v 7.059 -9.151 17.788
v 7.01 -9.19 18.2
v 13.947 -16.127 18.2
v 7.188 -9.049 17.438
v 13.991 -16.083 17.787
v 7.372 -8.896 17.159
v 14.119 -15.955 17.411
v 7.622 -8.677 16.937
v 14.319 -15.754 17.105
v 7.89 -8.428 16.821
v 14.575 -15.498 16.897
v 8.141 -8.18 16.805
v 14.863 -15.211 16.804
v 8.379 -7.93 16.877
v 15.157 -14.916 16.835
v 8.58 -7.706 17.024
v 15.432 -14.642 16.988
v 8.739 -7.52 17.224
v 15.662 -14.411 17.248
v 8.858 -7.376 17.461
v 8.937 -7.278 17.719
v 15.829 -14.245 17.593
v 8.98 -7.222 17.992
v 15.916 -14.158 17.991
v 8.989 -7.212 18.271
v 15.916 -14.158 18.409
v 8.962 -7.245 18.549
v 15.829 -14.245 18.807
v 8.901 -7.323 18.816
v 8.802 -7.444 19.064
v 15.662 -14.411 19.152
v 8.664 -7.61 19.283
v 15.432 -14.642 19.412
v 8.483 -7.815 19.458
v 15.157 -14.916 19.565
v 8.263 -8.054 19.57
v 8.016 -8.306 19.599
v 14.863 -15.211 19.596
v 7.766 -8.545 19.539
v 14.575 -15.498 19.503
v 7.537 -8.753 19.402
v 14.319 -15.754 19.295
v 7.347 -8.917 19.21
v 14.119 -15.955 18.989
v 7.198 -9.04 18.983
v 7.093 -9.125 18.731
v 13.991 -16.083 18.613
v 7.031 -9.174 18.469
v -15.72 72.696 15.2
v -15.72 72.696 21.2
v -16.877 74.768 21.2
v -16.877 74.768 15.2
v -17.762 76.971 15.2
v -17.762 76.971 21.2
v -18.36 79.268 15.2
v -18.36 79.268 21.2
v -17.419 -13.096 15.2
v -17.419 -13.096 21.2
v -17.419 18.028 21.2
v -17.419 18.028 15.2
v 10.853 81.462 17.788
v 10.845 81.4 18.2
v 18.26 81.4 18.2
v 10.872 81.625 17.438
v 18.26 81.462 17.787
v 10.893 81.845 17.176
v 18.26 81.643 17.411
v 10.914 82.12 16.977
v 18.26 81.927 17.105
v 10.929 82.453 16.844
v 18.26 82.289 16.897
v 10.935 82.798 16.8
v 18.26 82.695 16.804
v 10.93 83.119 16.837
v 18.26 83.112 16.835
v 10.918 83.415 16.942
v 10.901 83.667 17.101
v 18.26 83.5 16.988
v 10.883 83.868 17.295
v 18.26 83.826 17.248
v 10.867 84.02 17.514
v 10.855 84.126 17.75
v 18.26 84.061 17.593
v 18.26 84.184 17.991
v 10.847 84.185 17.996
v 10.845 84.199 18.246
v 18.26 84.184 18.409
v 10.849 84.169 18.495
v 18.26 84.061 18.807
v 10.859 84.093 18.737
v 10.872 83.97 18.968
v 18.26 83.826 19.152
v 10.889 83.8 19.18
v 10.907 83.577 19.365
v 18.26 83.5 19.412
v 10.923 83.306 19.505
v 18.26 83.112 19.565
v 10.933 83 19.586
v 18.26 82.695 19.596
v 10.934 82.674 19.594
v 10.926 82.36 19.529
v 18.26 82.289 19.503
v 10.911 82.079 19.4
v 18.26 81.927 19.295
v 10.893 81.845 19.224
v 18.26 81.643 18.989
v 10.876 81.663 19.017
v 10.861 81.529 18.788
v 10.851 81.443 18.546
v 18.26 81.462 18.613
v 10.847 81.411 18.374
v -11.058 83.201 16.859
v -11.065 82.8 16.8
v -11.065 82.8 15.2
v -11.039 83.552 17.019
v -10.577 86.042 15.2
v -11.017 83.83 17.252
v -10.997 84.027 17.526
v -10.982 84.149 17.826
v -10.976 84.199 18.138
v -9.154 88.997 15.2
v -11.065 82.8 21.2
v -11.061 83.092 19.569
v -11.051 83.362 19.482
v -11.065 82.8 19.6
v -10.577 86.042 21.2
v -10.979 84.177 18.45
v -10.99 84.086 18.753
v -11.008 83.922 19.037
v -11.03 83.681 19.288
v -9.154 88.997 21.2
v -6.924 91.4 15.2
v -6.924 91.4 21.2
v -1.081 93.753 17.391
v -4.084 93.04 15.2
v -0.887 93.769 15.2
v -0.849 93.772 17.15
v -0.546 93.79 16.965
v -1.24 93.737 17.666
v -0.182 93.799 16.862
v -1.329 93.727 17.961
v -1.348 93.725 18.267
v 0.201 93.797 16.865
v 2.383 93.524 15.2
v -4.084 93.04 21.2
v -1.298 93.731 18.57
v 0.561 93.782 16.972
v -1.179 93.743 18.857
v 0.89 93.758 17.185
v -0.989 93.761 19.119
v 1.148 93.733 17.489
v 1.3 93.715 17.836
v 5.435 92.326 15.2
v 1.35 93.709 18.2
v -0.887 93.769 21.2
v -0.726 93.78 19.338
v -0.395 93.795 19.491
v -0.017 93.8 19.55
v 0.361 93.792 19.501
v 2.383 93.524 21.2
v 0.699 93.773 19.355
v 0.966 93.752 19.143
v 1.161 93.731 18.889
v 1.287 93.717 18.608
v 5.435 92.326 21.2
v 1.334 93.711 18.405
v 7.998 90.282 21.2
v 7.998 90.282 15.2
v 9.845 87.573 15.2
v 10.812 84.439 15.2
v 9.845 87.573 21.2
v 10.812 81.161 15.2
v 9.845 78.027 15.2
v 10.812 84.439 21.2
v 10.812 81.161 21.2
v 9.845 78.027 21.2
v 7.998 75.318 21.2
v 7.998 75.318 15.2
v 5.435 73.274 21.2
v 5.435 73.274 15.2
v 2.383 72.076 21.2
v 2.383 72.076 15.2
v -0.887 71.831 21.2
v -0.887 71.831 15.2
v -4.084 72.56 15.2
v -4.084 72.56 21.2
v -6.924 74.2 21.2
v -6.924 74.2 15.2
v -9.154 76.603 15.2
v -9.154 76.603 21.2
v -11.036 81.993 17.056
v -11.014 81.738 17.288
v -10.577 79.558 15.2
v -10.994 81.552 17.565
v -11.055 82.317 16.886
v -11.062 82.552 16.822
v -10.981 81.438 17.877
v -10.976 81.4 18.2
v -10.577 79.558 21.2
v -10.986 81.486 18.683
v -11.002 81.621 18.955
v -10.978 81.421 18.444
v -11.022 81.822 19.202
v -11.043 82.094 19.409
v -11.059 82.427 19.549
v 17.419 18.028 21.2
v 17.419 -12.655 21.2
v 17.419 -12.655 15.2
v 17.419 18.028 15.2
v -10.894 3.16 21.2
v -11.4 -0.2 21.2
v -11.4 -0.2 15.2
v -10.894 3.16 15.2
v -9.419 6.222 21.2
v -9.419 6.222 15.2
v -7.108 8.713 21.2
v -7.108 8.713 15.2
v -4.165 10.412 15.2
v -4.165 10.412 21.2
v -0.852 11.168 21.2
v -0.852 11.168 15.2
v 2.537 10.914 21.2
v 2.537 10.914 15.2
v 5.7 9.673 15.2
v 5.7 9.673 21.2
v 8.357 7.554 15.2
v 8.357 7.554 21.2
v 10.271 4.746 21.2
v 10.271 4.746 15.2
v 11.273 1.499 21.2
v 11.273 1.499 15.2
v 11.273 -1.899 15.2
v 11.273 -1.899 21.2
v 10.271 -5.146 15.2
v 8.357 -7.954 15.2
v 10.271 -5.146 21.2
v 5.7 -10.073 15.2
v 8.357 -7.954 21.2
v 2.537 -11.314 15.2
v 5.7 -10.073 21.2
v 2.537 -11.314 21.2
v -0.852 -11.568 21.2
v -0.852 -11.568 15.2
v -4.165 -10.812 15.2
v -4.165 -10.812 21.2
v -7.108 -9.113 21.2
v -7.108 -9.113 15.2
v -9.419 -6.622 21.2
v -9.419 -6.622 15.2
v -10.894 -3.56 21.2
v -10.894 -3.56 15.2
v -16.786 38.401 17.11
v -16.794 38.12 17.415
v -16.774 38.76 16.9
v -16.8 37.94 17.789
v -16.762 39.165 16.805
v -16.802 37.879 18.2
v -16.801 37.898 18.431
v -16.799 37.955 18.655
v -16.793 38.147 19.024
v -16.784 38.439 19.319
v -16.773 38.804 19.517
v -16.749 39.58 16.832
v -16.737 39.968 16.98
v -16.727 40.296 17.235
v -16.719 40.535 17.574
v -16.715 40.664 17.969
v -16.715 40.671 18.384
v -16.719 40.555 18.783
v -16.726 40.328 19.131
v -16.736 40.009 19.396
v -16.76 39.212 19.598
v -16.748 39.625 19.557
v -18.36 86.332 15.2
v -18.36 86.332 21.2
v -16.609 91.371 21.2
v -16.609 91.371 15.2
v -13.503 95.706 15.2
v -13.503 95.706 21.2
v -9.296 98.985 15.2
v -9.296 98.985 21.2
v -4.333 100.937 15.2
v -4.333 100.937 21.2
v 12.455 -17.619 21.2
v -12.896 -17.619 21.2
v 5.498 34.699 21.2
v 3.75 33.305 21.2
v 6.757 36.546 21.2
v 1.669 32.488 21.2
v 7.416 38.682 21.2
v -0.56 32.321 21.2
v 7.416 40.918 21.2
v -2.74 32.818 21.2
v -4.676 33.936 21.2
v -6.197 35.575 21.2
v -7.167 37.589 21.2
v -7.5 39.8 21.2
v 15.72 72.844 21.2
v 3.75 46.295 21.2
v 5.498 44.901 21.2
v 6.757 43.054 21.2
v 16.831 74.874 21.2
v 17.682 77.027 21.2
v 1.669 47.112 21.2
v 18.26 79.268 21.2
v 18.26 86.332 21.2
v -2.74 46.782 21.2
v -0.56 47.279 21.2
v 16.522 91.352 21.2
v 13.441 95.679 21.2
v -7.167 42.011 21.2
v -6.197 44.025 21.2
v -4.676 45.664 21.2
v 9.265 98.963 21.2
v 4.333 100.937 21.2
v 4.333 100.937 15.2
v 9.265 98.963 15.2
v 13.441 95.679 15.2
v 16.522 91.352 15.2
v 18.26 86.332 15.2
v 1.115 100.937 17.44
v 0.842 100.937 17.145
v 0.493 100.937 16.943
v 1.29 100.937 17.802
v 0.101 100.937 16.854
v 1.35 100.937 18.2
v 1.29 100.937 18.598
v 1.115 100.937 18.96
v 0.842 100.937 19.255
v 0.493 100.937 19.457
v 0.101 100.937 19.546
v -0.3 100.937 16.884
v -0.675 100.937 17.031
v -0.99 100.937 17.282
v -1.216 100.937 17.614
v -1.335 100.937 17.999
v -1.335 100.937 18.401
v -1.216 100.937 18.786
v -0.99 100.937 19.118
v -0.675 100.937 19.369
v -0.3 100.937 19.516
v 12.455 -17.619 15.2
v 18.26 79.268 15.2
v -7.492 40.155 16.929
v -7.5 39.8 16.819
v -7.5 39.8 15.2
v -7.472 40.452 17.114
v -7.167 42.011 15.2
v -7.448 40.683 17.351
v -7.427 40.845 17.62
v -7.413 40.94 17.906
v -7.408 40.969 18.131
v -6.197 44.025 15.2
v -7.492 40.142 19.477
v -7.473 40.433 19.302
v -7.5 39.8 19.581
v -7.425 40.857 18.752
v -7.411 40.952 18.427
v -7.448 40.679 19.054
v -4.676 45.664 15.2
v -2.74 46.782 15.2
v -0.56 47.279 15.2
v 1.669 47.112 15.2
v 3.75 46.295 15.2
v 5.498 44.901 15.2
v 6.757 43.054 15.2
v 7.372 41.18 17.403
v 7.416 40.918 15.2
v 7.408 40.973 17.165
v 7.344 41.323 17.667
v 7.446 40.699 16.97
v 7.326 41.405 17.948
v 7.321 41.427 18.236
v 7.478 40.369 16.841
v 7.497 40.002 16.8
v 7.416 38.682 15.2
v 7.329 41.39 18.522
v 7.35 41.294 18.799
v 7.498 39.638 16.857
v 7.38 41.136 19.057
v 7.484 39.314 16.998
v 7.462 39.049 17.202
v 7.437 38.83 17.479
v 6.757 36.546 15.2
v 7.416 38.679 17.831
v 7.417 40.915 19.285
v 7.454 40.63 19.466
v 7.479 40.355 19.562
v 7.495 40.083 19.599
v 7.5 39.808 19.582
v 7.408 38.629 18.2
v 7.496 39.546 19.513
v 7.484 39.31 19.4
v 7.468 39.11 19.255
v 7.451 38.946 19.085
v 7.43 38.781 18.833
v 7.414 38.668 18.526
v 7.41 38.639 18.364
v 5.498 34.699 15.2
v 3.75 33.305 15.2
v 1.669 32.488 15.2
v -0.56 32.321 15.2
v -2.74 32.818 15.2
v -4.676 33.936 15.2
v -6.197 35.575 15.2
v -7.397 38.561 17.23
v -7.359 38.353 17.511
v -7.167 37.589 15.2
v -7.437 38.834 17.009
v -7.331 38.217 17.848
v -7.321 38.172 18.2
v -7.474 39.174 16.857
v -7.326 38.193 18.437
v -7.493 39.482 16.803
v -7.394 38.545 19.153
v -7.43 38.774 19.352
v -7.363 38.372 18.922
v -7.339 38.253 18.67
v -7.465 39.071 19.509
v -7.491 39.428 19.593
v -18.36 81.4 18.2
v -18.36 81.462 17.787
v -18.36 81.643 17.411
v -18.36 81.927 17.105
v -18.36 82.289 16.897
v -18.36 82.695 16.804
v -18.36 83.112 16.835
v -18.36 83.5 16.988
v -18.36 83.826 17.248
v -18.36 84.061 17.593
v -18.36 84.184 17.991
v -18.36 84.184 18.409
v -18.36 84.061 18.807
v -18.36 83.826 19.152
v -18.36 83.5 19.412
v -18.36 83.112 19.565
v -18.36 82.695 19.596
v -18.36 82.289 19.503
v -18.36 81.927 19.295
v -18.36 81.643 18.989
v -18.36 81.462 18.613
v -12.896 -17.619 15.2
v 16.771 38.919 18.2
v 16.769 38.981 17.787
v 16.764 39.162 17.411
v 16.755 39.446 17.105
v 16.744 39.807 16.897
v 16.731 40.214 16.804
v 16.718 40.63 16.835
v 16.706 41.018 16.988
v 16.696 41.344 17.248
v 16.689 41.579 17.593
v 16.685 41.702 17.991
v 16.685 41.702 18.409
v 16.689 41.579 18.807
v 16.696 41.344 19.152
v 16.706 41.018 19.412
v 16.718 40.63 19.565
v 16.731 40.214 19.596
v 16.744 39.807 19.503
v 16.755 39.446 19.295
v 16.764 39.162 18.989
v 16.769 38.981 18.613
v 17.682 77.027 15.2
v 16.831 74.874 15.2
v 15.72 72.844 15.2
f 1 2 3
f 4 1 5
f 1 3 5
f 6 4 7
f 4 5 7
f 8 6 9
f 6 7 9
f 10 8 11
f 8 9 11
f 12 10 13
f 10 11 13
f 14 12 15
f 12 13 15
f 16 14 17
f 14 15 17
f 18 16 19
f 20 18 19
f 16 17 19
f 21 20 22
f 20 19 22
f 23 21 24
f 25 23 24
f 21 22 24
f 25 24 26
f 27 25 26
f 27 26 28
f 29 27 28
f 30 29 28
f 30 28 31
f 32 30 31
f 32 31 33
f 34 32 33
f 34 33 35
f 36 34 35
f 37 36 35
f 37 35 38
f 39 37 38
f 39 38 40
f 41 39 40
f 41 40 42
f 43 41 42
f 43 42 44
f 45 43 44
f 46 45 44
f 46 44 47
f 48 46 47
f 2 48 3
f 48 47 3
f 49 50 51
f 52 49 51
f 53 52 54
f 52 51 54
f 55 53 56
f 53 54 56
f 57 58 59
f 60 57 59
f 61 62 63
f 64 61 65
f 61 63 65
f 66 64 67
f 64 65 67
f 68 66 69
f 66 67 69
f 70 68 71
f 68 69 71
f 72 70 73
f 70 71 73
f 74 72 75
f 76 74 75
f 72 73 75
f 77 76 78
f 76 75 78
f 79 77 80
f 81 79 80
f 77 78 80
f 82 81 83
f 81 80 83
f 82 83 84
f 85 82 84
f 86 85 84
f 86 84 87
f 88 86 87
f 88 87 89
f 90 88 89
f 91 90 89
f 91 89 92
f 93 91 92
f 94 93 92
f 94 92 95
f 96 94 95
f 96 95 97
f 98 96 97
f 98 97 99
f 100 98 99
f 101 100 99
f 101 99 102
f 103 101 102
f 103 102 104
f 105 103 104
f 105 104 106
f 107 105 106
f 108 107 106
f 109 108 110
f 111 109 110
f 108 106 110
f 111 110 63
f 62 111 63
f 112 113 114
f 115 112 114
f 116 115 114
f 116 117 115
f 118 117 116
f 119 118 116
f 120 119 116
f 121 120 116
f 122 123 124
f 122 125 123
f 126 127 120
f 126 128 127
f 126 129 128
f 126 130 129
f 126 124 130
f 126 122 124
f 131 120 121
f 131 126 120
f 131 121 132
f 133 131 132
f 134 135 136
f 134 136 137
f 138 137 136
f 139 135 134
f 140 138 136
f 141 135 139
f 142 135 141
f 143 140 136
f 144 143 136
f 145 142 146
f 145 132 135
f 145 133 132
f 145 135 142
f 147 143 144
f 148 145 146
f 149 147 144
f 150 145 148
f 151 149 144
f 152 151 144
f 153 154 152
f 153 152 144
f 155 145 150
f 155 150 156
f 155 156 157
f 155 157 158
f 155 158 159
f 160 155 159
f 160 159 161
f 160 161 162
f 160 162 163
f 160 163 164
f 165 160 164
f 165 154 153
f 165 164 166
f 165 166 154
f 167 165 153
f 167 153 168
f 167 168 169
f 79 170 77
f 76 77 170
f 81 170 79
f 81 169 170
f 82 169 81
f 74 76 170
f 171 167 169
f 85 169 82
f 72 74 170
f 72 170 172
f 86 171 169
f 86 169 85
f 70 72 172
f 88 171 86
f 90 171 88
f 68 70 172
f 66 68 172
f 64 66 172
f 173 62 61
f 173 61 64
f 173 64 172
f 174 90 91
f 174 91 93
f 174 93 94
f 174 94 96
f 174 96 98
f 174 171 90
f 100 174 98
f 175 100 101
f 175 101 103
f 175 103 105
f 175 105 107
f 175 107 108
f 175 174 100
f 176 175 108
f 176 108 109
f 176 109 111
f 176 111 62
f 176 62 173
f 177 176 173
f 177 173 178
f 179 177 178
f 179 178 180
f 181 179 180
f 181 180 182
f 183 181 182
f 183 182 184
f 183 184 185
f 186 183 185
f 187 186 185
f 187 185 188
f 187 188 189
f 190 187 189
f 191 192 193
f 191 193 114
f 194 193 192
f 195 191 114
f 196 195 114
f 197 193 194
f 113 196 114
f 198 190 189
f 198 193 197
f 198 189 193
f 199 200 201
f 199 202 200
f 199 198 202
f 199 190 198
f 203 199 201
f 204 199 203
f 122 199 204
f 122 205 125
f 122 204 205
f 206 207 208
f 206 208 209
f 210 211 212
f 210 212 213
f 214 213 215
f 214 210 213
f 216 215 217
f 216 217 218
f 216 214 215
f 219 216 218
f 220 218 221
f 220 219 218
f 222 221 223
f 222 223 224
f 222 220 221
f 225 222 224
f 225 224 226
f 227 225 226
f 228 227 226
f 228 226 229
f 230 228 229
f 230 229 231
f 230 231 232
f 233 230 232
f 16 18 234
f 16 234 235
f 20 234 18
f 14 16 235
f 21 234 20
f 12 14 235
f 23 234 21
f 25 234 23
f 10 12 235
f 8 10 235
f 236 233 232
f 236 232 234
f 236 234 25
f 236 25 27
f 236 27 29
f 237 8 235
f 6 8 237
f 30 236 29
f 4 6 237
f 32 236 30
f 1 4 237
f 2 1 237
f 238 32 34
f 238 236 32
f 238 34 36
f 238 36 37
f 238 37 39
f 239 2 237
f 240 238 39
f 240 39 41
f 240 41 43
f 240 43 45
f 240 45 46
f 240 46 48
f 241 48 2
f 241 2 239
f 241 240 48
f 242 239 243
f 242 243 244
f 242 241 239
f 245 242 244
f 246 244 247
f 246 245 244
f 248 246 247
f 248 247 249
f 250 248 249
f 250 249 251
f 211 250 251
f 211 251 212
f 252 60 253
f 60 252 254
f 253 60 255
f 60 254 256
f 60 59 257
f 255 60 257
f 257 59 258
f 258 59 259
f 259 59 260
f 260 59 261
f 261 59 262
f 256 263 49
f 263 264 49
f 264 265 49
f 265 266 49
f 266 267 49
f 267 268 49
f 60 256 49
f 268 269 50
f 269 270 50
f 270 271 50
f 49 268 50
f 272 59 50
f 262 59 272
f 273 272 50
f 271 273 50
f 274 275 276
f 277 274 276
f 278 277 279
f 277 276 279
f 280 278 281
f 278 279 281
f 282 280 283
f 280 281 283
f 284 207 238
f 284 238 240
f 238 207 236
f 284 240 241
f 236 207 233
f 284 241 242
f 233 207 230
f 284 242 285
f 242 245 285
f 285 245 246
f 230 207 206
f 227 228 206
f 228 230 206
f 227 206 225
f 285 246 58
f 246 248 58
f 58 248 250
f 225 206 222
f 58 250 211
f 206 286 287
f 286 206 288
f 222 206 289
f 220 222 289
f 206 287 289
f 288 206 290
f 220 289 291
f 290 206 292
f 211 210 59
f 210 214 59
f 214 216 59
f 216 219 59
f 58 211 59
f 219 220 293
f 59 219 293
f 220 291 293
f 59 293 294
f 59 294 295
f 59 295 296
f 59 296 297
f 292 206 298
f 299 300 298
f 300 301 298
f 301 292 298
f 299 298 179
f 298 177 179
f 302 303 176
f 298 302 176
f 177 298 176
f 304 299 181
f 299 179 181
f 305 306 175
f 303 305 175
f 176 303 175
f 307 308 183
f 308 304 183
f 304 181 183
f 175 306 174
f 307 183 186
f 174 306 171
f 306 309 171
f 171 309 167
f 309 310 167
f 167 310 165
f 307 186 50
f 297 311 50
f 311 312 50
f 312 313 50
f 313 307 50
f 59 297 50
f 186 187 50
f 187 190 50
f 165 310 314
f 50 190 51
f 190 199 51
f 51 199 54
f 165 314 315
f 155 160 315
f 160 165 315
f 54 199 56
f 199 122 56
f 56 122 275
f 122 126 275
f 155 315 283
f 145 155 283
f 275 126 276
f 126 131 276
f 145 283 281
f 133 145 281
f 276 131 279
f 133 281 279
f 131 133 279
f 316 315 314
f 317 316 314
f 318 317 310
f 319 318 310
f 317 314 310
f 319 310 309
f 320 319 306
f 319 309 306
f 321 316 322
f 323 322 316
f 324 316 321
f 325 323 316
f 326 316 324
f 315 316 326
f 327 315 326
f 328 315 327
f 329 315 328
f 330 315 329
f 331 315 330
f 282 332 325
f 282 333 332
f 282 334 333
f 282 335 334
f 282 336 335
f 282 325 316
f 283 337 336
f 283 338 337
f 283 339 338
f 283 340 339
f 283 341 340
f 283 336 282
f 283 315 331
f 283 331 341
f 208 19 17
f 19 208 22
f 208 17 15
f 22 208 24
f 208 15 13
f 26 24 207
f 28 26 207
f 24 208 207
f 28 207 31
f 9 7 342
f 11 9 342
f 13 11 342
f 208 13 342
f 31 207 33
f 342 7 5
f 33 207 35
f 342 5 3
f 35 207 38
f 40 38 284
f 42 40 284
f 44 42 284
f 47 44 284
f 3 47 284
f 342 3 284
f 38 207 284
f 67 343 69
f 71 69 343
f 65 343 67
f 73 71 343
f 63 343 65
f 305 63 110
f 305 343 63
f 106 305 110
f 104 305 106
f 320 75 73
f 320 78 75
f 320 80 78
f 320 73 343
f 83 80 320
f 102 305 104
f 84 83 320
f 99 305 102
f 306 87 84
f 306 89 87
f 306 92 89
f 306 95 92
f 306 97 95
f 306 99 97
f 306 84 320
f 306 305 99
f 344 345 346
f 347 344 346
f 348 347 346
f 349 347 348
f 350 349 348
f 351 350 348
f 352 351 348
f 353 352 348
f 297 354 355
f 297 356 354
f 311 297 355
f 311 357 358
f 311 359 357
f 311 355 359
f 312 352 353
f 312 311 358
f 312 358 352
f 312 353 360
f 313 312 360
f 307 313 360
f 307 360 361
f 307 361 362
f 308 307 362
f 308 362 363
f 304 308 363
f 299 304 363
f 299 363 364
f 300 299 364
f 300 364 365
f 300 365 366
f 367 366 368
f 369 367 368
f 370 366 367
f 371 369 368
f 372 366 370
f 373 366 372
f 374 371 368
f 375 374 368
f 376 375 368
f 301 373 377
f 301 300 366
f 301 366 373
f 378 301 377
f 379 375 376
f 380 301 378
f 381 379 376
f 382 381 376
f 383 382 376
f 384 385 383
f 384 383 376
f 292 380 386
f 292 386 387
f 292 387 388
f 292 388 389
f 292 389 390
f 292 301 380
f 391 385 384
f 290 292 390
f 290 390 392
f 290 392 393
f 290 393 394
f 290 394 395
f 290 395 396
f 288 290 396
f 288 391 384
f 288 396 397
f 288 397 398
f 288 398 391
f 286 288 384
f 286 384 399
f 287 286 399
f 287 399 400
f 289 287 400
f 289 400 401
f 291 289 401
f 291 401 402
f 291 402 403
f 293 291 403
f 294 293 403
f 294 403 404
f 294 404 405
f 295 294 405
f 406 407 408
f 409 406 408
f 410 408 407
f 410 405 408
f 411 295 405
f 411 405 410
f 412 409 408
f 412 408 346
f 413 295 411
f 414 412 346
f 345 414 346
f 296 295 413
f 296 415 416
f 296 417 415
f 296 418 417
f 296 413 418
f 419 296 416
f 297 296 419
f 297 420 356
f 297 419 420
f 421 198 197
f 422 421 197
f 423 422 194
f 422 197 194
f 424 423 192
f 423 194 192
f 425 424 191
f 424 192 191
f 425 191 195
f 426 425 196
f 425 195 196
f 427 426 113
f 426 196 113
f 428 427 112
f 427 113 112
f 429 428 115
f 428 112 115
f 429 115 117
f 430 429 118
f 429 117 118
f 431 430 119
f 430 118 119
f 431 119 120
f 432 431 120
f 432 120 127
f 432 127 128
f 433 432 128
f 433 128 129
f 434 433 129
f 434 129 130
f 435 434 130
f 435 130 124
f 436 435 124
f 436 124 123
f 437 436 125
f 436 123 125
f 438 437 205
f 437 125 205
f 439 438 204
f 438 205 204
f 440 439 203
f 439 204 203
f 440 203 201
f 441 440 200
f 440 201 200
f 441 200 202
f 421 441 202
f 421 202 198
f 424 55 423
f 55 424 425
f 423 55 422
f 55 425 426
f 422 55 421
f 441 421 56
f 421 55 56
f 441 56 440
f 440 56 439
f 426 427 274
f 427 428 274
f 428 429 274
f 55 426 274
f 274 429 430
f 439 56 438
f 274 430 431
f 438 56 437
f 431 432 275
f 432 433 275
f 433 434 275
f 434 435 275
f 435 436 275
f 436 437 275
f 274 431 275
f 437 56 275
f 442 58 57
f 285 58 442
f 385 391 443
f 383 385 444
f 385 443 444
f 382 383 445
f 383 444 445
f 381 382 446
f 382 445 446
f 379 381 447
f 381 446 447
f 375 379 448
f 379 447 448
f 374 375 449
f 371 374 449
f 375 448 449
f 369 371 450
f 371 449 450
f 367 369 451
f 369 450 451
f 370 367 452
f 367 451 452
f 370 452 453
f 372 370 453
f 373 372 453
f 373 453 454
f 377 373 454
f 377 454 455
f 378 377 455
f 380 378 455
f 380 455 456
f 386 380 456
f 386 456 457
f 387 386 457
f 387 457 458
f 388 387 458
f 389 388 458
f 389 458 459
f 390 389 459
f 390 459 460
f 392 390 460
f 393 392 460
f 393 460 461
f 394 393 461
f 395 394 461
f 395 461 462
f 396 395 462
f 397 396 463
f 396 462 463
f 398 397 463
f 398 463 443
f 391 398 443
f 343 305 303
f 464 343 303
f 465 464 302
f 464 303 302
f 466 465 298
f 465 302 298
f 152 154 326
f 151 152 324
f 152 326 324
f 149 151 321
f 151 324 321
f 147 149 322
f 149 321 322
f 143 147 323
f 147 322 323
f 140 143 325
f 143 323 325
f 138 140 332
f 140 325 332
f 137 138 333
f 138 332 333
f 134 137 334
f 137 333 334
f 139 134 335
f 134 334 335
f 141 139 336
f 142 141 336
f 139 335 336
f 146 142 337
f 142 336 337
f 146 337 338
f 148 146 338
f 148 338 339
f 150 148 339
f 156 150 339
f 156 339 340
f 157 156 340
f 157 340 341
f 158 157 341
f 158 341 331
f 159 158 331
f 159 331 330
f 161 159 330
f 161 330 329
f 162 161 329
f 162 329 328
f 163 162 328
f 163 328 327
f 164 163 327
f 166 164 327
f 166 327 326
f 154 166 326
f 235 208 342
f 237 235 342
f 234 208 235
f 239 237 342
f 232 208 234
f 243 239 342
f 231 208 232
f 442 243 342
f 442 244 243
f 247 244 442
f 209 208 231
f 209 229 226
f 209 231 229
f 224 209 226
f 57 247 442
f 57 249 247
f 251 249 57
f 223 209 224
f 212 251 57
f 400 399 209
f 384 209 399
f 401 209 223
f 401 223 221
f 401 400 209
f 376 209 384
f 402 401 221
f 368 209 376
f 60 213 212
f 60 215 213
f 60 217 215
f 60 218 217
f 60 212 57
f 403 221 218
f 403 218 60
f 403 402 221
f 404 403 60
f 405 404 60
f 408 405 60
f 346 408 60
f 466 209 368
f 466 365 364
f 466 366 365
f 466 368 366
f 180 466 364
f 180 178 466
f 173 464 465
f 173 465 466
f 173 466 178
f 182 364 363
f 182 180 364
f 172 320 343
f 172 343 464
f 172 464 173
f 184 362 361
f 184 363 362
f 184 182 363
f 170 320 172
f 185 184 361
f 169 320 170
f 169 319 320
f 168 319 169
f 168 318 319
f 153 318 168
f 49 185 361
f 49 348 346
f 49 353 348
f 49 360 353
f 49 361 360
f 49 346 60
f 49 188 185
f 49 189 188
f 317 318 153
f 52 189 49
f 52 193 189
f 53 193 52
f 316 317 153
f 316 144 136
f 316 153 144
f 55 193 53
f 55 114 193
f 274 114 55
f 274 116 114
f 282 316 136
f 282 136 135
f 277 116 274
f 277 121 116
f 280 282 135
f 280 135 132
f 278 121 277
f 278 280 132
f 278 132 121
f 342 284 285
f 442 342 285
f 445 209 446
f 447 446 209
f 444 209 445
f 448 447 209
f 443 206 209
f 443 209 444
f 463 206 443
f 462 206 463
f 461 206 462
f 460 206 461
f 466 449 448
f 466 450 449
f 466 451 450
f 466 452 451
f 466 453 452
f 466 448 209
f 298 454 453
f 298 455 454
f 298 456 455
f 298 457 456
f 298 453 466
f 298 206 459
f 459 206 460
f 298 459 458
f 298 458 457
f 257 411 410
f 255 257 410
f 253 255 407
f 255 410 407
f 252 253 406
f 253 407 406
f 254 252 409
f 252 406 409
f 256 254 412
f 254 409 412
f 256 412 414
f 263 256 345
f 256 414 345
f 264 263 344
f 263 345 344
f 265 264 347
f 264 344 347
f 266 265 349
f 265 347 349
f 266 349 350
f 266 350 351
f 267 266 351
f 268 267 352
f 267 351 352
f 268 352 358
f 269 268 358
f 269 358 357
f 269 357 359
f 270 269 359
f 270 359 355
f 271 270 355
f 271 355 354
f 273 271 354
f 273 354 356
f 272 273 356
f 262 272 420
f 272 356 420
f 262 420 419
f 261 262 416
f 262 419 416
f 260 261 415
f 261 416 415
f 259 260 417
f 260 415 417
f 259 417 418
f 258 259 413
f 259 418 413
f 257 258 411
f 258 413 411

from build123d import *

# Parameters (mm, degrees)
SKETCH002_R          = 7.5
SKETCH002_R_2        = 11.4
SKETCH002_R_3        = 11
PAD002_DEPTH         = 6
SKETCH003_R          = 1.4
POCKET_DEPTH         = 20
SKETCH004_R          = 1.4
POCKET001_DEPTH      = 36.866111375
SKETCH005_R          = 1.4
POCKET002_DEPTH      = 36.6206712513
SKETCH006_R          = 1.35
POCKET003_DEPTH      = 10
BODY_PLACEMENT_ANGLE = 180


with BuildPart() as part:
    # Sketch002 → Pad002 (new body)
    with BuildSketch(Plane.XY):
        with BuildLine():
            Line((17.4185858621, -21.7716146623), (15.72, 32.8960215672))
            ThreePointArc((15.72, 32.8960215672), (17.3549083149, 36.0552761319), (18.3596204304, 39.4676606599))
            Line((18.3596204304, 39.4676606599), (18.3596204304, 46.5323393401))
            ThreePointArc((18.3596204304, 46.5323393401), (13.5034413002, 55.9064608862), (4.3329172916, 61.1369598984))
            Line((-4.3329172916, 61.1369598984), (4.3329172916, 61.1369598984))
            ThreePointArc((-4.3329172916, 61.1369598984), (-13.4407809455, 55.8794757058), (-18.2600508209, 46.5323393401))
            Line((-18.2600508209, 39.4676606599), (-18.2600508209, 46.5323393401))
            ThreePointArc((-18.2600508209, 39.4676606599), (-17.2898053647, 36.137342842), (-15.72, 33.0441076213))
            Line((-17.4185858621, -21.7716146623), (-15.72, 33.0441076213))
            Line((-17.4185858621, -52.4548343373), (-17.4185858621, -21.7716146623))
            Line((-17.4185858621, -52.4548343373), (-12.4548343373, -57.4185858621))
            Line((-12.4548343373, -57.4185858621), (12.8963534851, -57.4185858621))
            Line((17.4185858621, -52.8963534851), (12.8963534851, -57.4185858621))
            Line((17.4185858621, -52.8963534851), (17.4185858621, -21.7716146623))
        make_face()
        Circle(SKETCH002_R, mode=Mode.SUBTRACT)
        with Locations((0, -40)):
            Circle(SKETCH002_R_2, mode=Mode.SUBTRACT)
        with Locations((0.0652183529, 43)):
            Circle(SKETCH002_R_3, mode=Mode.SUBTRACT)
    extrude(amount=PAD002_DEPTH)

    # Sketch003 (on Face12 of Pad002) → Pocket (cut)
    with BuildSketch(Plane(origin=(-34.9367100997, -34.9367100997, 0), x_dir=(0.7071067812, -0.7071067812, 0), z_dir=(-0.7071067812, -0.7071067812, 0))):
        with Locations((28.2842712475, 3)):
            Circle(SKETCH003_R)
    extrude(amount=-POCKET_DEPTH, mode=Mode.SUBTRACT)

    # Sketch004 (on Face14 of Pocket) → Pocket001 (cut, through all)
    with BuildSketch(Plane(origin=(-16.7278822151, 0.5183502661, 0), x_dir=(-0.0309723357, -0.9995202421, 0), z_dir=(-0.9995202421, 0.0309723357, 0))):
        with Locations((0, 3)):
            Circle(SKETCH004_R)
    extrude(amount=-POCKET001_DEPTH, mode=Mode.SUBTRACT)

    # Sketch005 (on Face13 of Pocket001) → Pocket002 (cut, through all)
    with BuildSketch(Plane(origin=(-18.2600508209, 0, 0), x_dir=(0, -1, 0), z_dir=(-1, 0, 0))):
        with Locations((-43, 3)):
            Circle(SKETCH005_R)
    extrude(amount=-POCKET002_DEPTH, mode=Mode.SUBTRACT)

    # Sketch006 (on Face11 of Pocket002) → Pocket003 (cut)
    with BuildSketch(Plane(origin=(0, 61.1369598984, 0), x_dir=(-1, 0, 0), z_dir=(0, 1, 0))):
        with Locations((0, 3)):
            Circle(SKETCH006_R)
    extrude(amount=-POCKET003_DEPTH, mode=Mode.SUBTRACT)


with BuildPart() as part_1:
    # Body002 placement: moved
    add(part.part.moved(Location((0, 39.8, -51))))


with BuildPart() as part_2:
    # Body placement: moved
    add(part_1.part.moved(Location((0, 0, -29.8))).rotate(Axis((0, 0, -29.8), (0, 1, 0)), BODY_PLACEMENT_ANGLE))


solid = part_2.part
